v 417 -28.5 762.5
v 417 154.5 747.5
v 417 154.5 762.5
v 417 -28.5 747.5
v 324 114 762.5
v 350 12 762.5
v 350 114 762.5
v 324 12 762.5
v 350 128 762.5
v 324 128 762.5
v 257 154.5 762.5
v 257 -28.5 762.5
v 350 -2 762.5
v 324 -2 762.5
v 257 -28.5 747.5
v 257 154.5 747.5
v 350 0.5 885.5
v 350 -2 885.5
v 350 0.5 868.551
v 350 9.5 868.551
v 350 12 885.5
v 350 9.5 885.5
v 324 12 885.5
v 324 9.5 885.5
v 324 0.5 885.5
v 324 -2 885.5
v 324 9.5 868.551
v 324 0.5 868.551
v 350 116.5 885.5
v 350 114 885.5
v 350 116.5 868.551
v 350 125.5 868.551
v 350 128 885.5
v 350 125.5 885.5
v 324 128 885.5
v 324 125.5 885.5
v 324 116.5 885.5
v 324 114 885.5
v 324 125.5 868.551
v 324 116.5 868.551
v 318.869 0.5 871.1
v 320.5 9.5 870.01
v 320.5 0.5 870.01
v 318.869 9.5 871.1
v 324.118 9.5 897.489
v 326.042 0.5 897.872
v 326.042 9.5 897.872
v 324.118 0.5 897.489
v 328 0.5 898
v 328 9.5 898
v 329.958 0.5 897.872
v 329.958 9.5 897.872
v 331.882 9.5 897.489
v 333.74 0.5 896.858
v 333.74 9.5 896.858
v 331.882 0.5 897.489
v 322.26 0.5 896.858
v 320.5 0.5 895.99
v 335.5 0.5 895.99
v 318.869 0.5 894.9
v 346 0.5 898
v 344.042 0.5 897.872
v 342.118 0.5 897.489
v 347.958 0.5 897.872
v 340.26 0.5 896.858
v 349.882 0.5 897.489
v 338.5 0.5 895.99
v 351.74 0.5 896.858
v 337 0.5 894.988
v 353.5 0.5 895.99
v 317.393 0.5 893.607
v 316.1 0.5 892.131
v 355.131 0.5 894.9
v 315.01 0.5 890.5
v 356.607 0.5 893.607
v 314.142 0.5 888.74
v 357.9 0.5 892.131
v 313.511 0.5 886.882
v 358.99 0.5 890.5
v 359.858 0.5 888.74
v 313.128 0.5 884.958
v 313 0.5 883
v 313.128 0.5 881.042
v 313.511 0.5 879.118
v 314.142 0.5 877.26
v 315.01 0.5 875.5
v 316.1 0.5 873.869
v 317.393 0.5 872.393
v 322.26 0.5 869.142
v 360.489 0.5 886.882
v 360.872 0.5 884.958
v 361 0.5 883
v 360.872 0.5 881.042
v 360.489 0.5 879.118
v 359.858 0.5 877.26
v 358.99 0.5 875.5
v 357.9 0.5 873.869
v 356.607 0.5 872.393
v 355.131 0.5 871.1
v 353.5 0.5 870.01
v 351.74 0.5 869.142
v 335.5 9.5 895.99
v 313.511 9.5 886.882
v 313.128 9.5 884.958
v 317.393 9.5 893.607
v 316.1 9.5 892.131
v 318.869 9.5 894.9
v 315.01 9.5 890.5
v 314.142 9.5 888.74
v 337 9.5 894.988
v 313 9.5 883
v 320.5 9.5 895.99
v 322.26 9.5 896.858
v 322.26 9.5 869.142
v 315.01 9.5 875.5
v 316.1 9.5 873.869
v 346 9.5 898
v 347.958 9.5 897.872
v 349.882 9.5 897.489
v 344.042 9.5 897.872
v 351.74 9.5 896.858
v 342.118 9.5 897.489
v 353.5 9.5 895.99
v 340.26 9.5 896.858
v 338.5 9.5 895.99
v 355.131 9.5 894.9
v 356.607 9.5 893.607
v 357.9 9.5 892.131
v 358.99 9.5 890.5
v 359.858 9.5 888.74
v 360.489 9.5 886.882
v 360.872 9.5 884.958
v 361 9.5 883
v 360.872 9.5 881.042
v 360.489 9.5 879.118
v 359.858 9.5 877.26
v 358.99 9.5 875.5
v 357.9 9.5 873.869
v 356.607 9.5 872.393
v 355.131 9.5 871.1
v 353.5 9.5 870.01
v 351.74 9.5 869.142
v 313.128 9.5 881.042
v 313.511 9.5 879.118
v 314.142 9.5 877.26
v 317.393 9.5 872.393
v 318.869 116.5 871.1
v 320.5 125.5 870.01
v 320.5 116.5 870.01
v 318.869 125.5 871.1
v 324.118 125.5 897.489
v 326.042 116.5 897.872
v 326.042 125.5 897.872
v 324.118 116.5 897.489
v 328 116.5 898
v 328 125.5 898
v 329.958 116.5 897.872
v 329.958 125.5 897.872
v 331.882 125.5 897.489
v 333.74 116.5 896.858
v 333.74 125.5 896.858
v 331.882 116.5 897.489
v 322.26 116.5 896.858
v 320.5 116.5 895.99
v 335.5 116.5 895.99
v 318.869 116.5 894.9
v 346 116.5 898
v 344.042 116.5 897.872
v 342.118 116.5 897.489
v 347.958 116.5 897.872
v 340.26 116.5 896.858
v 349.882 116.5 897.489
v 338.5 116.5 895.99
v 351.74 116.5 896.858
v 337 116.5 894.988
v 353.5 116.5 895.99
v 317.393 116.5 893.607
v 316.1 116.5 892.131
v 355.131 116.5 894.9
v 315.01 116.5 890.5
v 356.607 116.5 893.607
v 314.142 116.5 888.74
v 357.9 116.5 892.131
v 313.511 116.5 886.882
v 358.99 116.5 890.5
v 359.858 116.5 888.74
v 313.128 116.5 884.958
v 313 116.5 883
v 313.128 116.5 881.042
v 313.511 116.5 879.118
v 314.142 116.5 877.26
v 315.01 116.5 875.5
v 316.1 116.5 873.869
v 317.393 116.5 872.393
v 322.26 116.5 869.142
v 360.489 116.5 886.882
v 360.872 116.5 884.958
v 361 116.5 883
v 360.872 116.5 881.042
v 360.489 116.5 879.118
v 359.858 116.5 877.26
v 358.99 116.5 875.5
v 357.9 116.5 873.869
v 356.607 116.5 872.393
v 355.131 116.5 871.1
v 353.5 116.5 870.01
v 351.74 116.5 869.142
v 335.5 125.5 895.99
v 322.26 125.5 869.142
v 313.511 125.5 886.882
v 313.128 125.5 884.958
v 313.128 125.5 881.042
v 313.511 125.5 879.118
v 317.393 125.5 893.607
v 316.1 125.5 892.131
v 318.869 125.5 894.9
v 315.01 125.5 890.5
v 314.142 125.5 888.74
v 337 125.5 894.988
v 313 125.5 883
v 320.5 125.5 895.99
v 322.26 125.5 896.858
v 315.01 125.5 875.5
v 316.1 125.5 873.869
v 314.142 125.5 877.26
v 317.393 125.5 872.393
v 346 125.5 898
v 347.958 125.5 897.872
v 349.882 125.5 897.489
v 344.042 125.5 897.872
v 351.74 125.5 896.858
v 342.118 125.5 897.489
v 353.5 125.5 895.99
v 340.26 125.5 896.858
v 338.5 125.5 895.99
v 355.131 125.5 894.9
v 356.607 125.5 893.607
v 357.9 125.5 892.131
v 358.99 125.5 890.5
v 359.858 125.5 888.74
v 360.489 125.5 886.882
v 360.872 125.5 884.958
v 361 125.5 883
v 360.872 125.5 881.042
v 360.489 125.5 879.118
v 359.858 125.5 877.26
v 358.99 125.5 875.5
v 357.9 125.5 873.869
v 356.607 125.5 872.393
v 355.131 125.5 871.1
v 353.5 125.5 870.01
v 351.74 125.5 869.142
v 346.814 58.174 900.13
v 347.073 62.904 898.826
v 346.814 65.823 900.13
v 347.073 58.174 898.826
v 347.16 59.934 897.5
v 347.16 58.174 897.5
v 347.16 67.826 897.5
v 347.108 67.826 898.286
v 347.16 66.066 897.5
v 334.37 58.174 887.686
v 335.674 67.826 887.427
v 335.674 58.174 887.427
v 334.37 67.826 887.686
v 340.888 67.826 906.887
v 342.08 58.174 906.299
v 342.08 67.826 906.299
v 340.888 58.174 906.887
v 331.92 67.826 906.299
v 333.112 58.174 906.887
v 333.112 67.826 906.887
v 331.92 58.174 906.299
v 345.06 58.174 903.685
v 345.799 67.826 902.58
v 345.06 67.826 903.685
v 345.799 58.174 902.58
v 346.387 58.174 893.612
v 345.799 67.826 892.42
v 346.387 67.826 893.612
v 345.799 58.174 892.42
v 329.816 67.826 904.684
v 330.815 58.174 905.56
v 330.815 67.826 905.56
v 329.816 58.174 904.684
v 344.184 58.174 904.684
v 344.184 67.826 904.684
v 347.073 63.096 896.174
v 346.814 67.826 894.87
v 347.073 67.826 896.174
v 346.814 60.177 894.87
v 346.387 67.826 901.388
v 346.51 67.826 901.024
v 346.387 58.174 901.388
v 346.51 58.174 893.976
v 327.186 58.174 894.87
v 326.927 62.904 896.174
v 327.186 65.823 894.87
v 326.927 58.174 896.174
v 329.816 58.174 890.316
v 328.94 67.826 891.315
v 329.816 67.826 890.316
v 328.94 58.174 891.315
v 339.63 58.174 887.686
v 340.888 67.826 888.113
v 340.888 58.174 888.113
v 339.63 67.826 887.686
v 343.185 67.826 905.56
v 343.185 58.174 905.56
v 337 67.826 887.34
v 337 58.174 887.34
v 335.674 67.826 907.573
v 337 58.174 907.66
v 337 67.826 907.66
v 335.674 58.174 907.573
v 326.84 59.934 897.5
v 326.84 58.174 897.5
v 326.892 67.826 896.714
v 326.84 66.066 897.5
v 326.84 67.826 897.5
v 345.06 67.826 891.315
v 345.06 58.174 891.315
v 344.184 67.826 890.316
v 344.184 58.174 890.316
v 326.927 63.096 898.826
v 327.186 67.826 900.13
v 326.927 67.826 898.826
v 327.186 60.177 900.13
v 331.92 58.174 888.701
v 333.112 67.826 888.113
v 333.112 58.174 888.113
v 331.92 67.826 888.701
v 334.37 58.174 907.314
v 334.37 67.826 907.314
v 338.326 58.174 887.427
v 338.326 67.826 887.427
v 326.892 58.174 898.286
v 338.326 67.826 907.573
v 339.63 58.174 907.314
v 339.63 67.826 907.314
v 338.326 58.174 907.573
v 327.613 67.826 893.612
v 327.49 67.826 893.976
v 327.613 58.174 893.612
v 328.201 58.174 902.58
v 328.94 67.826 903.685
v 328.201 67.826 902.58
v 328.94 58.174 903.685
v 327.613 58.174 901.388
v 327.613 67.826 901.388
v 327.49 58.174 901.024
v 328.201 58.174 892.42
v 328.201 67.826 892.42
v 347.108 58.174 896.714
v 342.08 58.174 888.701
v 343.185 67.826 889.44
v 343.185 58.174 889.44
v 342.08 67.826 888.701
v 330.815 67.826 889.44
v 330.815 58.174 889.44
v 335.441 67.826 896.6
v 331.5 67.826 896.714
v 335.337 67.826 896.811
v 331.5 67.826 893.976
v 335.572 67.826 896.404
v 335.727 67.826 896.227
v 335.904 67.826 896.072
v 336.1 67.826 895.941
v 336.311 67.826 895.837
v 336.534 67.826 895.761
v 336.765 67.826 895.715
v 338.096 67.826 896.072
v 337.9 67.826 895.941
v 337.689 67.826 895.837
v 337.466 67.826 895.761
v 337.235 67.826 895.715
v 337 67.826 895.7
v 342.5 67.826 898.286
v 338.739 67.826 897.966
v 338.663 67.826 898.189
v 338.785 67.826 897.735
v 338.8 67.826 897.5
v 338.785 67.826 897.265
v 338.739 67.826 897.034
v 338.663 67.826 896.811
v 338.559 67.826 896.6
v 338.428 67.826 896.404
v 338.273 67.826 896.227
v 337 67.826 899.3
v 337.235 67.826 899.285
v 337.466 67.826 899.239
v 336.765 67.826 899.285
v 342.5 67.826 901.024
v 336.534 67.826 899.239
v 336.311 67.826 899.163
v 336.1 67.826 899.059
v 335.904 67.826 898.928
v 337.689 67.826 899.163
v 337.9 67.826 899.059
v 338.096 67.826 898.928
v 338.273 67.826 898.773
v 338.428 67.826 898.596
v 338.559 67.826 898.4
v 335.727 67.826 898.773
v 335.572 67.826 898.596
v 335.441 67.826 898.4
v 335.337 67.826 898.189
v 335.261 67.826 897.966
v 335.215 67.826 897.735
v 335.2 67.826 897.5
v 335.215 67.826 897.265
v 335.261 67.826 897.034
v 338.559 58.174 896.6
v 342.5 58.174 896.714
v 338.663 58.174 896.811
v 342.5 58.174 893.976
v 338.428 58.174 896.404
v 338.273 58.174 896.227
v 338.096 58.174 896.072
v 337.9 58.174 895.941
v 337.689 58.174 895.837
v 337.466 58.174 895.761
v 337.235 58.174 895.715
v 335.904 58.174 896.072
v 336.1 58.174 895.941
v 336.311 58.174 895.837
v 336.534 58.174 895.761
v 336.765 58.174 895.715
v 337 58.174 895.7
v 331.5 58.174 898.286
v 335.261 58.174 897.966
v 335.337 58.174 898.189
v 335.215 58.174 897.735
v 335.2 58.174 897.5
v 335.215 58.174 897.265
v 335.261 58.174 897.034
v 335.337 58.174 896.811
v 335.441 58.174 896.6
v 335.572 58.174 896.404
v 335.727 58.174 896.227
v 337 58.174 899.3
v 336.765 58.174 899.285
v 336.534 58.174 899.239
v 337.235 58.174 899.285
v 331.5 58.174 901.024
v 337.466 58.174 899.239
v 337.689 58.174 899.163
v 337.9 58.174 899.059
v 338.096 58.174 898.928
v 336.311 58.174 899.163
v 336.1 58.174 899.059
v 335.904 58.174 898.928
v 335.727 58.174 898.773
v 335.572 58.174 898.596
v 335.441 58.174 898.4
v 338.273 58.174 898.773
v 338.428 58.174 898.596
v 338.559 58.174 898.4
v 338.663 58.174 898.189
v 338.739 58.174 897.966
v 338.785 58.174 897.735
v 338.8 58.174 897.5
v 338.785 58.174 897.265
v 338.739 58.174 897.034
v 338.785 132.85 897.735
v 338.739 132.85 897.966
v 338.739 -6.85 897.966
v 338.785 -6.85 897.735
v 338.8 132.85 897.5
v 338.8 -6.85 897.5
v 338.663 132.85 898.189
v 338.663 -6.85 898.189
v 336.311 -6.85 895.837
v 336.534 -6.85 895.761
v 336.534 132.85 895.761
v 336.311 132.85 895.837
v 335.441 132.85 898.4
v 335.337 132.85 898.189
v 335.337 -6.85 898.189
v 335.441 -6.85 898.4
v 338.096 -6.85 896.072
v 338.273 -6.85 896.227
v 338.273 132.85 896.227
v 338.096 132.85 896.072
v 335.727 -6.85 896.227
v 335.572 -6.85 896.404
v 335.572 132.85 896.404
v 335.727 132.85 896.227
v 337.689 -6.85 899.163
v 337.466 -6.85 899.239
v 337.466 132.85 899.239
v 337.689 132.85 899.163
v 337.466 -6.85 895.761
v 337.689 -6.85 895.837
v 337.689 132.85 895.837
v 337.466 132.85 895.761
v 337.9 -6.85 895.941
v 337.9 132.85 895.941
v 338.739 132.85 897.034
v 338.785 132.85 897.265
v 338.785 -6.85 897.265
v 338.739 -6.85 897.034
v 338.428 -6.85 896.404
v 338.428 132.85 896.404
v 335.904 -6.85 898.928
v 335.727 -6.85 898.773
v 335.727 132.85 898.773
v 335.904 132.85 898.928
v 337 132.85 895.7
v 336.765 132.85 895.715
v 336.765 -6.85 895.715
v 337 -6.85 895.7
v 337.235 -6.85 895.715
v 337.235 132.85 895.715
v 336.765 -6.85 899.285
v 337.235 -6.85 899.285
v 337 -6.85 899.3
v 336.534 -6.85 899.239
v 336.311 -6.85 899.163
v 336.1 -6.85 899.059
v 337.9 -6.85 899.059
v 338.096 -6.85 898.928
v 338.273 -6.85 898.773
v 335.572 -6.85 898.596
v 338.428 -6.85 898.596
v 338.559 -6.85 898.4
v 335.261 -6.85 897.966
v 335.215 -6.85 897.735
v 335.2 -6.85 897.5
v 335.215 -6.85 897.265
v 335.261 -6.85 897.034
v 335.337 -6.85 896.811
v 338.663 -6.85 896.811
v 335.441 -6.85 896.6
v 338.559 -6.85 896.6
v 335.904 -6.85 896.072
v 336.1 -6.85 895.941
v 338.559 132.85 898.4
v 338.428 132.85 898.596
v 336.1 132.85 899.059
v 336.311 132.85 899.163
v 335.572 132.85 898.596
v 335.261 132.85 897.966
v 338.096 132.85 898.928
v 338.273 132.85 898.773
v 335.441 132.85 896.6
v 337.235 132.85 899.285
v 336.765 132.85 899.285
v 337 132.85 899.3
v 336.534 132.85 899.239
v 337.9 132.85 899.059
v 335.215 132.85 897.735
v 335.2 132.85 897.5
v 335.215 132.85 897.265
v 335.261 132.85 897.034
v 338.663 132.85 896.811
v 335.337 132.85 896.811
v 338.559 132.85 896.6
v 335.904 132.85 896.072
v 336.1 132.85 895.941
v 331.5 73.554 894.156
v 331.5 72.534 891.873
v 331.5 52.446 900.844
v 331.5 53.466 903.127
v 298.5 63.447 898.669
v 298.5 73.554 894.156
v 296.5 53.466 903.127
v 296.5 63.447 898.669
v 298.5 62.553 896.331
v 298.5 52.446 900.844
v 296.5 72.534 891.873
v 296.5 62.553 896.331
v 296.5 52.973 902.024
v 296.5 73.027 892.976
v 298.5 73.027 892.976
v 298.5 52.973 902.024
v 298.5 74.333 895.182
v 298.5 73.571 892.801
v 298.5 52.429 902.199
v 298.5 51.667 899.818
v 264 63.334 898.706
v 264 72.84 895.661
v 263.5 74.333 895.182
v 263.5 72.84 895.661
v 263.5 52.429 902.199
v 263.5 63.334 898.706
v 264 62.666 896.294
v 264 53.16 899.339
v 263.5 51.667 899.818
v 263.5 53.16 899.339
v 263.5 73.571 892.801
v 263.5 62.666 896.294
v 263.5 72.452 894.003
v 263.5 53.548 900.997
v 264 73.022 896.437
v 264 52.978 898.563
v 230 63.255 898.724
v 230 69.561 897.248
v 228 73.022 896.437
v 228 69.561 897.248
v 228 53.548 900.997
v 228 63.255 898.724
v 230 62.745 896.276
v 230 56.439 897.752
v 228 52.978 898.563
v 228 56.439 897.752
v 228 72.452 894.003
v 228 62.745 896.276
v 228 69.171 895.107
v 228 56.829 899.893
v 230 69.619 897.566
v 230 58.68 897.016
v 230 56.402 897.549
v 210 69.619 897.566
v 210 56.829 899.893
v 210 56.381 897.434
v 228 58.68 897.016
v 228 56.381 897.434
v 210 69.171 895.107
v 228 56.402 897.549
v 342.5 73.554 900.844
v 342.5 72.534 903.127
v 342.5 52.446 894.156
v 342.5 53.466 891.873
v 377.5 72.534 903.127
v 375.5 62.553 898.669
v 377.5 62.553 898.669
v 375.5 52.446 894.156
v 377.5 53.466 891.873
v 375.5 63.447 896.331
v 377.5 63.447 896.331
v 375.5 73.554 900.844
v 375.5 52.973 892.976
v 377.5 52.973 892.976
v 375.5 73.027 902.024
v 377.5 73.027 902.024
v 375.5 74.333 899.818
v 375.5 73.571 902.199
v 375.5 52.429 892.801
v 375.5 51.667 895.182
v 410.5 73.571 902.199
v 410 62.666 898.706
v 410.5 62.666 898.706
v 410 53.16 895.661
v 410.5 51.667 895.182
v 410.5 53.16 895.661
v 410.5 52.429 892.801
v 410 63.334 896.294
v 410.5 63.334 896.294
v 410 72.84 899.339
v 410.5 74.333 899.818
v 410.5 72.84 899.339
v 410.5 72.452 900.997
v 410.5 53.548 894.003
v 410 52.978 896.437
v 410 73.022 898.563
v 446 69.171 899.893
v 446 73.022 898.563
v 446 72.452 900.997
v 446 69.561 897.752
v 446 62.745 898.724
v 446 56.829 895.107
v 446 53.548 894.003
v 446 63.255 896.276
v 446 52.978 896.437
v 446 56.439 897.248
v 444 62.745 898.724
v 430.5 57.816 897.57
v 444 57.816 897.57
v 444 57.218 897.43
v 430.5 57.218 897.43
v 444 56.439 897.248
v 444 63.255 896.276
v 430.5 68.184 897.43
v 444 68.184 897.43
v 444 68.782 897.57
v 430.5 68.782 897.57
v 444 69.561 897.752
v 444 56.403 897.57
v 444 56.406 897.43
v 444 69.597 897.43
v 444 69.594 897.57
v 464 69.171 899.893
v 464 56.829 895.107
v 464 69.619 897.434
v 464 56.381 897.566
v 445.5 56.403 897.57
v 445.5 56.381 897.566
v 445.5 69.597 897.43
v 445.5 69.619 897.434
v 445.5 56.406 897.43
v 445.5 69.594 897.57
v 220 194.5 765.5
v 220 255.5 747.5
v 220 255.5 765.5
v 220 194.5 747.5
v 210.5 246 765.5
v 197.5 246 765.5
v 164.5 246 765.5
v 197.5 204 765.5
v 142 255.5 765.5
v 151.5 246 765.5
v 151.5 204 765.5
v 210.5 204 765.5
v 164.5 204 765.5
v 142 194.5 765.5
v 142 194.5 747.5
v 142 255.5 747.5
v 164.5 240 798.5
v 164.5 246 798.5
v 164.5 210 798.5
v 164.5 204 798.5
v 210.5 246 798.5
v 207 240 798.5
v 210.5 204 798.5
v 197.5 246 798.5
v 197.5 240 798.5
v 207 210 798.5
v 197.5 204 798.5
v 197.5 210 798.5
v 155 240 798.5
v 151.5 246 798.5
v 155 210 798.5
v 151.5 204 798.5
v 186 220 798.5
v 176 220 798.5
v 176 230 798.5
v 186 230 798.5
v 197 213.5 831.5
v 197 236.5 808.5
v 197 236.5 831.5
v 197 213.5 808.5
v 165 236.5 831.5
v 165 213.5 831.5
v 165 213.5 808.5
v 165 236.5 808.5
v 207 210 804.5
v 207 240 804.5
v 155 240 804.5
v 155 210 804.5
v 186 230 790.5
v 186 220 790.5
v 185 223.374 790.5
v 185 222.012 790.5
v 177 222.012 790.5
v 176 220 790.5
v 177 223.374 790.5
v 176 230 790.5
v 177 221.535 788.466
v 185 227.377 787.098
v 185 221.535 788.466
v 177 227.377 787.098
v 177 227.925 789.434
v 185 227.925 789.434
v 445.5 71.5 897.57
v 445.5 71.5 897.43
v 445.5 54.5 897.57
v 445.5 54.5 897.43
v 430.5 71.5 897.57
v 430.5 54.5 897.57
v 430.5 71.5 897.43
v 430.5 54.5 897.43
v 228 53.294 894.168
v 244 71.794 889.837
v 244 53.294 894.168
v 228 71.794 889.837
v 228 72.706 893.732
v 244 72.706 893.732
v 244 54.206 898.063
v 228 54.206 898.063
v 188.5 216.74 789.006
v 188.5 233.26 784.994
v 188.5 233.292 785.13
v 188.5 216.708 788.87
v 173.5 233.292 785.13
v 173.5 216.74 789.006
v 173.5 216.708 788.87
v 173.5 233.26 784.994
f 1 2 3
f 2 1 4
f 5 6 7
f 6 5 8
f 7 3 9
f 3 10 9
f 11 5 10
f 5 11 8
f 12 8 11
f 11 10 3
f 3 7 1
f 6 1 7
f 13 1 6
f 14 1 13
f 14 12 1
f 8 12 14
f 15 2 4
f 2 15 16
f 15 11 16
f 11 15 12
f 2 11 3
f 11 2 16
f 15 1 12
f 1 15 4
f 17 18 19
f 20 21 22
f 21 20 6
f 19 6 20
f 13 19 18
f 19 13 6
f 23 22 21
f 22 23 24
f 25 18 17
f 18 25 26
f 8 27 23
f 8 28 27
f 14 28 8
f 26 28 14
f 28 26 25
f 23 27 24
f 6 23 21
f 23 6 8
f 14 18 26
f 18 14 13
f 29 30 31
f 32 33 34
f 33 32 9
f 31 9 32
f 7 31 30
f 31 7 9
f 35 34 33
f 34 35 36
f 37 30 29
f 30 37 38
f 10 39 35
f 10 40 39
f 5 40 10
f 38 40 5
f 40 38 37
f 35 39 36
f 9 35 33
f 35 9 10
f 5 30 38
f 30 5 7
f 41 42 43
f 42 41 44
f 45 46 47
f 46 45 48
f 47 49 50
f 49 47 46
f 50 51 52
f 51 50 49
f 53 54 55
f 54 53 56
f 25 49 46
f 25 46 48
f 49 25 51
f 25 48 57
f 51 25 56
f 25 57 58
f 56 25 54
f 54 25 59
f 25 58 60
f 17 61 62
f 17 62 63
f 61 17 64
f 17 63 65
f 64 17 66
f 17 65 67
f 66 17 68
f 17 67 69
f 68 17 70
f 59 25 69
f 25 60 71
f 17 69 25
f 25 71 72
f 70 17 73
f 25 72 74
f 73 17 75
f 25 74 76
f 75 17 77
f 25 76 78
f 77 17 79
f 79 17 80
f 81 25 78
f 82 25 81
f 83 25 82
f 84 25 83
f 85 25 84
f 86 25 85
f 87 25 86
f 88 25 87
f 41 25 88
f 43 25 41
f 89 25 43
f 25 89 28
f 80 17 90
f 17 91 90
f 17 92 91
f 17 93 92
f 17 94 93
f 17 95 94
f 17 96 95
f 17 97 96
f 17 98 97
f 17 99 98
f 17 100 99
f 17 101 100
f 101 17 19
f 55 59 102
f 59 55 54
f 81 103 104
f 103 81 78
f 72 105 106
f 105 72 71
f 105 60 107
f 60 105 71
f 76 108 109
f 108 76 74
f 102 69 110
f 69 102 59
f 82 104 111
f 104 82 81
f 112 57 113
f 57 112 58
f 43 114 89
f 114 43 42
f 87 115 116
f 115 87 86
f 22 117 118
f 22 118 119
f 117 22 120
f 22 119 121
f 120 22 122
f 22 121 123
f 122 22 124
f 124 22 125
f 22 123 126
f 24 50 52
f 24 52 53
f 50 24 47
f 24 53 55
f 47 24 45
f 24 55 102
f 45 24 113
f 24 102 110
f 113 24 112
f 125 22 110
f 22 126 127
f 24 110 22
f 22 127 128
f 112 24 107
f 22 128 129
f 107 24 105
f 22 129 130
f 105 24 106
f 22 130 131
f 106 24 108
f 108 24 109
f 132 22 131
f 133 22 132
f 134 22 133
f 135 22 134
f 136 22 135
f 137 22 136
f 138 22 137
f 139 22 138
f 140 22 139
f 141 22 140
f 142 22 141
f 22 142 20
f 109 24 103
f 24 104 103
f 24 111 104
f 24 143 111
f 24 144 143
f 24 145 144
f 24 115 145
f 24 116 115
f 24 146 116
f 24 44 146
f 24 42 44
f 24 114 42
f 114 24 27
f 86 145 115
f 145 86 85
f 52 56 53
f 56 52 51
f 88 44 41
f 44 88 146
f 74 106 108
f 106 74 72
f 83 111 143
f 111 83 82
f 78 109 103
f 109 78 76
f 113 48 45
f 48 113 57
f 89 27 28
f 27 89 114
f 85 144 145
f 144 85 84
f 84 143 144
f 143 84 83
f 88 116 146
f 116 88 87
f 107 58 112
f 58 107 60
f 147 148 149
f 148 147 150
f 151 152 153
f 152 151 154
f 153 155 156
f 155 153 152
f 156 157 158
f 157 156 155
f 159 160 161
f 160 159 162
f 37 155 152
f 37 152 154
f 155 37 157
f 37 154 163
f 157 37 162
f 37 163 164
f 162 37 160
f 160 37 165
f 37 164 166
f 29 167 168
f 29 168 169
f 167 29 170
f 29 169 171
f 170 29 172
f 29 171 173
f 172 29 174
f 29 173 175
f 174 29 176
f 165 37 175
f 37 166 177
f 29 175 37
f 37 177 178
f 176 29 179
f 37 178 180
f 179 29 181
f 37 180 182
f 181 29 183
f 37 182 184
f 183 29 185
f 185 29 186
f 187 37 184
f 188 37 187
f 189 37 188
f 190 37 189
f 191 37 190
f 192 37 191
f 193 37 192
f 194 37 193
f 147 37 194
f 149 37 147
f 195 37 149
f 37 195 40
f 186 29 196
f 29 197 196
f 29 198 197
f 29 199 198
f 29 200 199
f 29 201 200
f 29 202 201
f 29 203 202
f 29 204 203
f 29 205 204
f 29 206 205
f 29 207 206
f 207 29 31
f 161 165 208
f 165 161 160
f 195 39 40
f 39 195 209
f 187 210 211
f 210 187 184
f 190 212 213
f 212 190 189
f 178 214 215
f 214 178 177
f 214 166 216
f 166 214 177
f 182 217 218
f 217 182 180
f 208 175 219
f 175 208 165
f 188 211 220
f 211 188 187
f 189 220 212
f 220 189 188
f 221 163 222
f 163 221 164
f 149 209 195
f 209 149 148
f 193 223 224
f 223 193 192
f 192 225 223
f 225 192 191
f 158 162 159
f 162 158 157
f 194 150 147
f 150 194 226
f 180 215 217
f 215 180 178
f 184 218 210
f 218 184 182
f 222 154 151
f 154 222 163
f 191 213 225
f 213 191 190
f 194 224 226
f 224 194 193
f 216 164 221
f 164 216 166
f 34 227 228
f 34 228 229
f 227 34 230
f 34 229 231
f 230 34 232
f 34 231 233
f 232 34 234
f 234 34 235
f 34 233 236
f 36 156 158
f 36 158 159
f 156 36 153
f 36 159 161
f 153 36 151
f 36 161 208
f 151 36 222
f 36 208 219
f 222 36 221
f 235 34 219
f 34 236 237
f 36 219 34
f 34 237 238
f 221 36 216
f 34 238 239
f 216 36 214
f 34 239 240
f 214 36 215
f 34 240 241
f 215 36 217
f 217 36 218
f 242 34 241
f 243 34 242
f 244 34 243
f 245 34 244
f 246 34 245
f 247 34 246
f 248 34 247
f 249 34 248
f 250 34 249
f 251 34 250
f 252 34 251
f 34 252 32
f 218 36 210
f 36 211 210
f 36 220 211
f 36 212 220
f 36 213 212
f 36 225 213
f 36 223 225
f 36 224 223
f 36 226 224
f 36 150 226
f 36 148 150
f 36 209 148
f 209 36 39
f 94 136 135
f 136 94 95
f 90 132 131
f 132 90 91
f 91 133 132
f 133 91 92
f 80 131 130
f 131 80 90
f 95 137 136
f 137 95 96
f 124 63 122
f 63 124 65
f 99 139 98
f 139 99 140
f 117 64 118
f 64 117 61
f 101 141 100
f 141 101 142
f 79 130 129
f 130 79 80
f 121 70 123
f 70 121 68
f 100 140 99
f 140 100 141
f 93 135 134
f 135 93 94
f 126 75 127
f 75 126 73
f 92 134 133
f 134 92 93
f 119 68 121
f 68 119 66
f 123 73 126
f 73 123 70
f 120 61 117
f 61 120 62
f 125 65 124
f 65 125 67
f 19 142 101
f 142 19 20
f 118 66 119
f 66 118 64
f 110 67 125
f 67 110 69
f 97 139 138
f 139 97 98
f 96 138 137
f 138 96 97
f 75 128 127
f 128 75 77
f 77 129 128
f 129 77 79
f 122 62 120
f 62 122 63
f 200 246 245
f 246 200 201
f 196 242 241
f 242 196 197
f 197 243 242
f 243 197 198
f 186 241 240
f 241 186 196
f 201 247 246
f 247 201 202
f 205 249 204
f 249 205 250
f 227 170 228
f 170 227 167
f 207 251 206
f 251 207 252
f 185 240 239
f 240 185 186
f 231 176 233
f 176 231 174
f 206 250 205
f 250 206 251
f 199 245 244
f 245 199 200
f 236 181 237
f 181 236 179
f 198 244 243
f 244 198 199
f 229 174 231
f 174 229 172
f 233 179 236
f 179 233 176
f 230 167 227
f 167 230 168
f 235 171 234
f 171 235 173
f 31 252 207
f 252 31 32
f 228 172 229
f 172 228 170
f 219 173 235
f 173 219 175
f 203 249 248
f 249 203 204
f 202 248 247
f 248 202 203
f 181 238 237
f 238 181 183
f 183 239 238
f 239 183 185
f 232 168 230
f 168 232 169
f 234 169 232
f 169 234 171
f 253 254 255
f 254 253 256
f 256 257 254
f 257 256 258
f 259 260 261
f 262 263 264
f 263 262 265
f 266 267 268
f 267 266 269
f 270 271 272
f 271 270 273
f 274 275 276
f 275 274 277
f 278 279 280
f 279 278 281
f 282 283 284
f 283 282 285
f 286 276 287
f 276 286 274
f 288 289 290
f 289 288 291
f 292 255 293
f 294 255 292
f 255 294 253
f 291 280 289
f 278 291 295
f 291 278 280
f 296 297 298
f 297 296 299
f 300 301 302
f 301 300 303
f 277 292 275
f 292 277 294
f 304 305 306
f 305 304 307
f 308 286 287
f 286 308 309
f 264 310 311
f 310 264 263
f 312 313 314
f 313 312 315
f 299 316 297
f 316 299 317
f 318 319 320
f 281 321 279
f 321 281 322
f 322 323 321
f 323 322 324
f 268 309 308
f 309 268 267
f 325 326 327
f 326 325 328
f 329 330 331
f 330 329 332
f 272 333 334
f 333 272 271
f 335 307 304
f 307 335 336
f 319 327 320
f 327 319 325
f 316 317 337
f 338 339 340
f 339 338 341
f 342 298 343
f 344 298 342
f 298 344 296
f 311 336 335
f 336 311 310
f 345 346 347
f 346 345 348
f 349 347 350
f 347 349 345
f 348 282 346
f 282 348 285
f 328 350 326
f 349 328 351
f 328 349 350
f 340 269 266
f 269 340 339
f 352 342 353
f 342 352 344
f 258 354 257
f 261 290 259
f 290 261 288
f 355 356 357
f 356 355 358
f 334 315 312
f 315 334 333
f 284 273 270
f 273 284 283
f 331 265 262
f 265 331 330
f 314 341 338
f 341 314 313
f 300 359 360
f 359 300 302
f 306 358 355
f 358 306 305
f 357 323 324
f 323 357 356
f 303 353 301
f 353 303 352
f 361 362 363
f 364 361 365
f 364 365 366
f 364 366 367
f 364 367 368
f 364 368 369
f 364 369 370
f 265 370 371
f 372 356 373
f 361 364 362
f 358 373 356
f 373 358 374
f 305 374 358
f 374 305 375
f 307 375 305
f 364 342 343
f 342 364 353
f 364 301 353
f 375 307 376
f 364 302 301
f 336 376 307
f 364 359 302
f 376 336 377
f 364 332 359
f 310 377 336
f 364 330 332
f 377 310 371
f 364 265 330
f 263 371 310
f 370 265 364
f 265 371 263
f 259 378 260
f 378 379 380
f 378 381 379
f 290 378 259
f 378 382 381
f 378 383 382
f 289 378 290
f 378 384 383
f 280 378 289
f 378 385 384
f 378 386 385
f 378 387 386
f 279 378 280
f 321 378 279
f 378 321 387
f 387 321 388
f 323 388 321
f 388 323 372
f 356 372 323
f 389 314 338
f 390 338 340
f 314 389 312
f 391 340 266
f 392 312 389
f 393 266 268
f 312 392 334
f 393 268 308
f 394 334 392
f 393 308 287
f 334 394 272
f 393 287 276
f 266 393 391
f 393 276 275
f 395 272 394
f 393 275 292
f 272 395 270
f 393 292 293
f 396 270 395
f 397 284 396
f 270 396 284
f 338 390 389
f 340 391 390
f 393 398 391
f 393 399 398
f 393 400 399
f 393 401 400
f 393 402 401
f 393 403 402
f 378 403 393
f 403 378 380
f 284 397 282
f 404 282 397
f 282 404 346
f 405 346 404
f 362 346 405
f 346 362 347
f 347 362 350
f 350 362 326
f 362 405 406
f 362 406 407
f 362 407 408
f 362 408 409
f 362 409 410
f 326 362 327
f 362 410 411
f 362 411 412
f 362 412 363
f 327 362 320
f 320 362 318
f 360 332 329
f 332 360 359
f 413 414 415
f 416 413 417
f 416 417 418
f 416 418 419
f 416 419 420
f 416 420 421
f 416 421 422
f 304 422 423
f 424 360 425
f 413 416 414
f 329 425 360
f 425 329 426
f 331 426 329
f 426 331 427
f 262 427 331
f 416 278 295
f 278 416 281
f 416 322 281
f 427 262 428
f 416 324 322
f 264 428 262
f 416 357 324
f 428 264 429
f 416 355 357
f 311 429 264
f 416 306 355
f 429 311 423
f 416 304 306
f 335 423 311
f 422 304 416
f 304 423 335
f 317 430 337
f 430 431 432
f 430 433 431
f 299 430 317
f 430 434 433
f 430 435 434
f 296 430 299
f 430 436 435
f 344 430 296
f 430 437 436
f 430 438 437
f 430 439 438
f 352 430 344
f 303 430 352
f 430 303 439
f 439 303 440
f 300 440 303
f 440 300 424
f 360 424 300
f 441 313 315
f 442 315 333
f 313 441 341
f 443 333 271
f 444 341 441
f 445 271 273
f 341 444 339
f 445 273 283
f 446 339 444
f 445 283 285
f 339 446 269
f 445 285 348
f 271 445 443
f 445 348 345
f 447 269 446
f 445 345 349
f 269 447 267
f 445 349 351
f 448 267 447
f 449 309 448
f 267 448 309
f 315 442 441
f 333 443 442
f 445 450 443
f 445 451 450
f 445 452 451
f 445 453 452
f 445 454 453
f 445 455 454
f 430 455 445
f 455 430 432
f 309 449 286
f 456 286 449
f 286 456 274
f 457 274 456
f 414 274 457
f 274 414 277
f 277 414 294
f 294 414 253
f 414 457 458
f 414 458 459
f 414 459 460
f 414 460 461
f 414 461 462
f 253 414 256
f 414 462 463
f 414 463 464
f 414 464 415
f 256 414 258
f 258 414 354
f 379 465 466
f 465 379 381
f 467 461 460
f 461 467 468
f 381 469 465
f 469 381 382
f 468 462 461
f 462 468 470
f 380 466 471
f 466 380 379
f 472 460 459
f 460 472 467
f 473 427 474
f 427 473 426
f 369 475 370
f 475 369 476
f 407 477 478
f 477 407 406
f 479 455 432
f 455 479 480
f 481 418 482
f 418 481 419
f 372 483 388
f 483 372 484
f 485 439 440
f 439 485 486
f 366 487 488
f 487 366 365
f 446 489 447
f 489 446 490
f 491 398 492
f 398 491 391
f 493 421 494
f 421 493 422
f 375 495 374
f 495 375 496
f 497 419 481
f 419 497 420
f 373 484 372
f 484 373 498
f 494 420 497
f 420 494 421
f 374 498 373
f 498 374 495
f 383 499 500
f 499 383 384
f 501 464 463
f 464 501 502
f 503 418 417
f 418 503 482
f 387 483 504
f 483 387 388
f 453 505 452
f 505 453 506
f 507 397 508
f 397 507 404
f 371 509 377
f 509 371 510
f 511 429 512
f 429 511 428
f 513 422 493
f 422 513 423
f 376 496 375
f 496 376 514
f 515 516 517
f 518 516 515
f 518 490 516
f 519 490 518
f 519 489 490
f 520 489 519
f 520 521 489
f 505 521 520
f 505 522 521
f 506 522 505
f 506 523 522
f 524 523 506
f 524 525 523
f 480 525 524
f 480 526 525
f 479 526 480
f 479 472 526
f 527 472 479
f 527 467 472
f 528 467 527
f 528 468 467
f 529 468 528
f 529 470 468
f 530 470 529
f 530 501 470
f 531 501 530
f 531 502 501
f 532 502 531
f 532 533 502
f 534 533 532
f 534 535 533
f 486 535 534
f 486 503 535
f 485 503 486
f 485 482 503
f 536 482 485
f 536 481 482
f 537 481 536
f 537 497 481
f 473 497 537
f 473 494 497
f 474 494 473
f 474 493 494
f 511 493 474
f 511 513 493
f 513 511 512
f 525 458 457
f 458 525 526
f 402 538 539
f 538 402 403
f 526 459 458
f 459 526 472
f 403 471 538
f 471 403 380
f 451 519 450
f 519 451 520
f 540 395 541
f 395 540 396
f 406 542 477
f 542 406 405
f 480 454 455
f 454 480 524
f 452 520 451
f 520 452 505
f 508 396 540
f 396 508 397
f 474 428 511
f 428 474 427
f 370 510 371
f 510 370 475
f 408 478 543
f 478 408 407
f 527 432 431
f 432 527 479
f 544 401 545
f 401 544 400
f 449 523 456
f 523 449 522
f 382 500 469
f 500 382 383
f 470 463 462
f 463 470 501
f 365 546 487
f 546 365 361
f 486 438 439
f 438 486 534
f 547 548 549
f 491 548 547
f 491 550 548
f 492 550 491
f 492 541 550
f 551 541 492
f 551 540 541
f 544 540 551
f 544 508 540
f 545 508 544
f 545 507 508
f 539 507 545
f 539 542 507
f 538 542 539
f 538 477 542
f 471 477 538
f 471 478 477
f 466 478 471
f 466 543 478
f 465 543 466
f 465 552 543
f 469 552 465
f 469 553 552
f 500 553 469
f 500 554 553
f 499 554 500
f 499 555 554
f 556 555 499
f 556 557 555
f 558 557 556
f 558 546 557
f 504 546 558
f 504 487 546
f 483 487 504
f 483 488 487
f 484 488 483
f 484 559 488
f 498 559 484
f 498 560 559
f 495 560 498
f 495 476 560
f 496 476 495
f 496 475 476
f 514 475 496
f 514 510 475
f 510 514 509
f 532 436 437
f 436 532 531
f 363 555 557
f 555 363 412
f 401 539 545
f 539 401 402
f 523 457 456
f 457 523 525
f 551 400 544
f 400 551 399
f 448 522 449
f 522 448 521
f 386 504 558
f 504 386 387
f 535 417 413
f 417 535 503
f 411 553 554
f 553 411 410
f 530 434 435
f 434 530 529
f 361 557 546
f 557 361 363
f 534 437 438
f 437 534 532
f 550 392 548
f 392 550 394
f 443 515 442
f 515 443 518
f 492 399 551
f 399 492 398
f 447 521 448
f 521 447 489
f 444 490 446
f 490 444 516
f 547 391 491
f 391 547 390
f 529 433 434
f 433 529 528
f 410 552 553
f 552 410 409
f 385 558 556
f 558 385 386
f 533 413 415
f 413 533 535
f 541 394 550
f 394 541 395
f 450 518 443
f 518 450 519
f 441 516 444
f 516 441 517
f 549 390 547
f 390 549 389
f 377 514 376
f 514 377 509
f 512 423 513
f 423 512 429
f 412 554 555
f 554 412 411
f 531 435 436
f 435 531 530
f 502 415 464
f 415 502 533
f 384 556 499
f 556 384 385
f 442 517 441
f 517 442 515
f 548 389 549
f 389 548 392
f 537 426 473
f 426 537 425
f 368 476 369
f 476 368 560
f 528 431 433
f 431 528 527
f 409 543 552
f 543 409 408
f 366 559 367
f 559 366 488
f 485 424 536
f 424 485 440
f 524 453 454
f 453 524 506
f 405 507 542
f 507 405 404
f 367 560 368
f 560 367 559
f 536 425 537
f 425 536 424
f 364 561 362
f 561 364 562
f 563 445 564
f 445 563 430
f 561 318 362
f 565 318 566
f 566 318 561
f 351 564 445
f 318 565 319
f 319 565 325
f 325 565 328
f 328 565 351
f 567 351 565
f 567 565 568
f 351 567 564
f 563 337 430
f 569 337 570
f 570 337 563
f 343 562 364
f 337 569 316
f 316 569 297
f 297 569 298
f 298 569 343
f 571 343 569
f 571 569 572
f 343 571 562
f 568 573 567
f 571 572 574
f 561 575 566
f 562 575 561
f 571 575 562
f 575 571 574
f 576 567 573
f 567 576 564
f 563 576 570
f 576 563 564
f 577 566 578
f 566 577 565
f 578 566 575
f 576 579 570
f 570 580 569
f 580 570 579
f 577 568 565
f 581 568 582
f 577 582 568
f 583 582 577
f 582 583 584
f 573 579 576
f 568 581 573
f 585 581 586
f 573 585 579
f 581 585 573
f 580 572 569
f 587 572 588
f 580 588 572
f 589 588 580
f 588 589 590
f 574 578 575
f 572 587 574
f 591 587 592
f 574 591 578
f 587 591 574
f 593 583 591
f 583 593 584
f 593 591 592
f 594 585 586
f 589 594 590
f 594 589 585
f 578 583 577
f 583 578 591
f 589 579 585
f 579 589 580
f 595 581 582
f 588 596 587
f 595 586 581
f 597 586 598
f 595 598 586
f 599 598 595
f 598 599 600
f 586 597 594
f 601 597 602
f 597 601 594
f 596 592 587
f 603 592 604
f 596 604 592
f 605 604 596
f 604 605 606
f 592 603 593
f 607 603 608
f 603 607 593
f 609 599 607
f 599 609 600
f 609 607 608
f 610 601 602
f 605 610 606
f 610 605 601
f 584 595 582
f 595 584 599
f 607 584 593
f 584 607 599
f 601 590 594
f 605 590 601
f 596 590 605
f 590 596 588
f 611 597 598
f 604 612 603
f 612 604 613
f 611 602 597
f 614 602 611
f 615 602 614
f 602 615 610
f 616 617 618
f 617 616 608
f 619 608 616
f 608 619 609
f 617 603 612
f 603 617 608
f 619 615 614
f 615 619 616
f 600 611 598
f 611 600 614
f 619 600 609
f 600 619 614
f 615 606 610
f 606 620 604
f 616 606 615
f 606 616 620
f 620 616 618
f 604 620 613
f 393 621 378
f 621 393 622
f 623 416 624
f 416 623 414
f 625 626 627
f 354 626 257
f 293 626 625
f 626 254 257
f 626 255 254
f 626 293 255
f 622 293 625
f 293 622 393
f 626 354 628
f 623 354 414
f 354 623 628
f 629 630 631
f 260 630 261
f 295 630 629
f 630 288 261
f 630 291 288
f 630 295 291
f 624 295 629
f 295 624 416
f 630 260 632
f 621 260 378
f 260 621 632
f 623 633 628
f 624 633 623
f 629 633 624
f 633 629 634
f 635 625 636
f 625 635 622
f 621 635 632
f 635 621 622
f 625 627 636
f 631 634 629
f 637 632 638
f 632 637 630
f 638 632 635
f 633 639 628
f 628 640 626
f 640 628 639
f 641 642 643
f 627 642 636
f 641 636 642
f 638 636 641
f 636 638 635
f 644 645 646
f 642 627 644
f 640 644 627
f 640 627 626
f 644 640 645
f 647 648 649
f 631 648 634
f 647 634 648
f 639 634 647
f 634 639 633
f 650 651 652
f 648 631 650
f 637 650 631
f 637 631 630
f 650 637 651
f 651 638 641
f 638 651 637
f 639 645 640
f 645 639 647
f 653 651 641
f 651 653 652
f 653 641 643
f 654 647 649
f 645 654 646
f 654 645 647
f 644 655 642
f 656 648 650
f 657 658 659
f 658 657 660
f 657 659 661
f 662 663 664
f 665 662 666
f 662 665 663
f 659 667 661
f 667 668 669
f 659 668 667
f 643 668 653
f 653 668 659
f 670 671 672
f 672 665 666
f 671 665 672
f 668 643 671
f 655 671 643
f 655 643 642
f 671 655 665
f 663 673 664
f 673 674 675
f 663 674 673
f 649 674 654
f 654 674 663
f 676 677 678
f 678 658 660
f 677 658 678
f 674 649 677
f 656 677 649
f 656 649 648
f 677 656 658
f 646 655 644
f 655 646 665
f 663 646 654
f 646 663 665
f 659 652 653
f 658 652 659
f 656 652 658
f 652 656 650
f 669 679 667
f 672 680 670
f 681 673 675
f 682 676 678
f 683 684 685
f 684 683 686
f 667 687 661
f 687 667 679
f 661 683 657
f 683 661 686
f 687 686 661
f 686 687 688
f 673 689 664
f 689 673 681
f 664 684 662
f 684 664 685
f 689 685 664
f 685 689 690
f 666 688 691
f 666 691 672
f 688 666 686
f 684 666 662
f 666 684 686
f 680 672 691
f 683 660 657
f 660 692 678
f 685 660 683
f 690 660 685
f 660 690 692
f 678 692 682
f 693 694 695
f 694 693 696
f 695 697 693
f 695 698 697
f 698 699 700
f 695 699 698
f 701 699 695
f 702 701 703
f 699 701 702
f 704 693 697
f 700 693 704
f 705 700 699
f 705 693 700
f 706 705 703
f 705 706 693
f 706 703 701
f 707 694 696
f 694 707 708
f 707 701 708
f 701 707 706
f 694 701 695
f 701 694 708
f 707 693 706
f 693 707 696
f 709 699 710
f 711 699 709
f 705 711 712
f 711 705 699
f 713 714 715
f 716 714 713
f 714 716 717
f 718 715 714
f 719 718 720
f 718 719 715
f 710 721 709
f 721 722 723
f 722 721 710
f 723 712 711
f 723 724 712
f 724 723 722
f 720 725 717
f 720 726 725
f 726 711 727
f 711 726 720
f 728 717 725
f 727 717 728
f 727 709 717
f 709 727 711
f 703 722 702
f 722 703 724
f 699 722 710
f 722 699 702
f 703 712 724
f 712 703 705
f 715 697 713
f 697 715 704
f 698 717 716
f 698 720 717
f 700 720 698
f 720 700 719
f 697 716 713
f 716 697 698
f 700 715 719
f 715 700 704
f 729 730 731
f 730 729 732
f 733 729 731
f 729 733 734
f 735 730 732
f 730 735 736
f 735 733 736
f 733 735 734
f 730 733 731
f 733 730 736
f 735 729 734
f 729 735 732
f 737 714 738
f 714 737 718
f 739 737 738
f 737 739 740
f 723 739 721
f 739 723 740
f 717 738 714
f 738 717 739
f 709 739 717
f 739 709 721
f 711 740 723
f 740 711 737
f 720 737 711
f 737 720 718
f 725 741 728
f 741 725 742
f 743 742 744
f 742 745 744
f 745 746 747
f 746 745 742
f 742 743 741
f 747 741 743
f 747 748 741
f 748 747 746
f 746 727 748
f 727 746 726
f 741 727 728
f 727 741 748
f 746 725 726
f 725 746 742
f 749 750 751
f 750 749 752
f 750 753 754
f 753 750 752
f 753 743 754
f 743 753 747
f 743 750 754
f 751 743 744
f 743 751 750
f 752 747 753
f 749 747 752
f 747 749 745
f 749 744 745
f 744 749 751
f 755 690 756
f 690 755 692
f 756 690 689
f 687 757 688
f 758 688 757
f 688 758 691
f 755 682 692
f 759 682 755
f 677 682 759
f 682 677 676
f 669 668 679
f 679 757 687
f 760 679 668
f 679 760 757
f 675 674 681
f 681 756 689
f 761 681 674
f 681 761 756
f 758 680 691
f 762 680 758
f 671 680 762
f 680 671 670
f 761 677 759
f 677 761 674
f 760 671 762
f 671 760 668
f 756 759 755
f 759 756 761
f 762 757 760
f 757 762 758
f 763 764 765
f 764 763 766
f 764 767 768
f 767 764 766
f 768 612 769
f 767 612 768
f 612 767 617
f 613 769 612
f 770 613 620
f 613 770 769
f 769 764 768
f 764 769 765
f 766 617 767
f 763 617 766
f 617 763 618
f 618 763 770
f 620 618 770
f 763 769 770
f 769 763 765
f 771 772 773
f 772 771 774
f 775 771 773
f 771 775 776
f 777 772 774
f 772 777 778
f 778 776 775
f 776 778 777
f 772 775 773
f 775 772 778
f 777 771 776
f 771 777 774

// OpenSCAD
// Millimetre geometric reference; use real functional tools, not printed heated or cutting equipment.
// Source SHA-256: 8b96dedb1c2f85fbb0d14d824020c0c2b3ab92e54d9b9f7108995de31b6dab03
$fn=48;
module balancer(){
translate([0, 0, 0]) rotate([0, 0, 0]) cube([160, 183, 15],center=true);
translate([0, -58, 69]) rotate([0, 0, 0]) cube([26, 14, 123],center=true);
translate([0, 58, 69]) rotate([0, 0, 0]) cube([26, 14, 123],center=true);
translate([-9, -58, 128]) rotate([0, 0, 0]) rotate([90,0,0]) cylinder(r=15,h=9,center=true);
translate([-9, 58, 128]) rotate([0, 0, 0]) rotate([90,0,0]) cylinder(r=15,h=9,center=true);
translate([9, -58, 128]) rotate([0, 0, 0]) rotate([90,0,0]) cylinder(r=15,h=9,center=true);
translate([9, 58, 128]) rotate([0, 0, 0]) rotate([90,0,0]) cylinder(r=15,h=9,center=true);
}
module propeller(){
translate([0, 0, 0]) rotate([0, 0, 0]) rotate([90,0,0]) cylinder(r=10.16,h=9.652,center=true);
translate([0, 0, 0]) rotate([0, 0, 0]) rotate([90,0,0]) cylinder(r=1.8,h=139.7,center=true);
translate([-23, 0, 0]) rotate([-24.0642273955, 0, 0]) cube([35, 22, 2.5],center=true);
translate([-56, 0, 0]) rotate([-17.7616916491, 0, 0]) cube([35, 23, 2.5],center=true);
translate([-91, 0, 0]) rotate([-13.178029288, 0, 0]) cube([36, 20, 2.5],center=true);
translate([-117, 0, 0]) rotate([-10.3132403124, 0, 0]) cube([20, 13, 2.5],center=true);
translate([23, 0, 0]) rotate([24.0642273955, 0, 0]) cube([35, 22, 2.5],center=true);
translate([56, 0, 0]) rotate([17.7616916491, 0, 0]) cube([35, 23, 2.5],center=true);
translate([91, 0, 0]) rotate([13.178029288, 0, 0]) cube([36, 20, 2.5],center=true);
translate([117, 0, 0]) rotate([10.3132403124, 0, 0]) cube([20, 13, 2.5],center=true);
}
module excess_mass(){
translate([0, 0, 0]) rotate([0, 0, 0]) cube([15, 17, 0.14],center=true);
}
module blade_backing(){
translate([0, 0, 0]) rotate([-13.178029288, 0, 0]) cube([16, 19, 4],center=true);
}
module tamp_stand(){
translate([0, 0, 0]) rotate([0, 0, 0]) cube([78, 61, 18],center=true);
translate([-23, 0, 25.5]) rotate([0, 0, 0]) cube([13, 42, 33],center=true);
translate([23, 0, 25.5]) rotate([0, 0, 0]) cube([13, 42, 33],center=true);
}
module balancing_tape(){
translate([0, 0, 0]) rotate([-13.178029288, 0, 0]) cube([15, 17, 0.14],center=true);
}
module tamp_tool(){
translate([0, 0, 11.5]) rotate([0, 0, 0]) cube([32, 23, 23],center=true);
translate([0, 0, -7]) rotate([0, 0, 0]) cube([52, 30, 6],center=true);
translate([0, 0, -13.5]) rotate([0, 0, 0]) cube([10, 10, 9],center=true);
translate([0, -0.27, -19.55]) rotate([-13.178029288, 0, 0]) cube([8, 6, 2.4],center=true);
}
translate([337, 63, 755]) rotate([0,0,0]) balancer();
translate([337, 63, 897.5]) rotate([0,0,0]) propeller();
translate([438, 63, 897.5]) rotate([0,0,0]) excess_mass();
translate([236, 63, 893.95]) rotate([0,0,0]) blade_backing();
translate([181, 225, 756.5]) rotate([0,0,0]) tamp_stand();
translate([181, 225, 787]) rotate([0,0,0]) balancing_tape();
translate([181, 225, 808.5]) rotate([0,0,0]) tamp_tool();
